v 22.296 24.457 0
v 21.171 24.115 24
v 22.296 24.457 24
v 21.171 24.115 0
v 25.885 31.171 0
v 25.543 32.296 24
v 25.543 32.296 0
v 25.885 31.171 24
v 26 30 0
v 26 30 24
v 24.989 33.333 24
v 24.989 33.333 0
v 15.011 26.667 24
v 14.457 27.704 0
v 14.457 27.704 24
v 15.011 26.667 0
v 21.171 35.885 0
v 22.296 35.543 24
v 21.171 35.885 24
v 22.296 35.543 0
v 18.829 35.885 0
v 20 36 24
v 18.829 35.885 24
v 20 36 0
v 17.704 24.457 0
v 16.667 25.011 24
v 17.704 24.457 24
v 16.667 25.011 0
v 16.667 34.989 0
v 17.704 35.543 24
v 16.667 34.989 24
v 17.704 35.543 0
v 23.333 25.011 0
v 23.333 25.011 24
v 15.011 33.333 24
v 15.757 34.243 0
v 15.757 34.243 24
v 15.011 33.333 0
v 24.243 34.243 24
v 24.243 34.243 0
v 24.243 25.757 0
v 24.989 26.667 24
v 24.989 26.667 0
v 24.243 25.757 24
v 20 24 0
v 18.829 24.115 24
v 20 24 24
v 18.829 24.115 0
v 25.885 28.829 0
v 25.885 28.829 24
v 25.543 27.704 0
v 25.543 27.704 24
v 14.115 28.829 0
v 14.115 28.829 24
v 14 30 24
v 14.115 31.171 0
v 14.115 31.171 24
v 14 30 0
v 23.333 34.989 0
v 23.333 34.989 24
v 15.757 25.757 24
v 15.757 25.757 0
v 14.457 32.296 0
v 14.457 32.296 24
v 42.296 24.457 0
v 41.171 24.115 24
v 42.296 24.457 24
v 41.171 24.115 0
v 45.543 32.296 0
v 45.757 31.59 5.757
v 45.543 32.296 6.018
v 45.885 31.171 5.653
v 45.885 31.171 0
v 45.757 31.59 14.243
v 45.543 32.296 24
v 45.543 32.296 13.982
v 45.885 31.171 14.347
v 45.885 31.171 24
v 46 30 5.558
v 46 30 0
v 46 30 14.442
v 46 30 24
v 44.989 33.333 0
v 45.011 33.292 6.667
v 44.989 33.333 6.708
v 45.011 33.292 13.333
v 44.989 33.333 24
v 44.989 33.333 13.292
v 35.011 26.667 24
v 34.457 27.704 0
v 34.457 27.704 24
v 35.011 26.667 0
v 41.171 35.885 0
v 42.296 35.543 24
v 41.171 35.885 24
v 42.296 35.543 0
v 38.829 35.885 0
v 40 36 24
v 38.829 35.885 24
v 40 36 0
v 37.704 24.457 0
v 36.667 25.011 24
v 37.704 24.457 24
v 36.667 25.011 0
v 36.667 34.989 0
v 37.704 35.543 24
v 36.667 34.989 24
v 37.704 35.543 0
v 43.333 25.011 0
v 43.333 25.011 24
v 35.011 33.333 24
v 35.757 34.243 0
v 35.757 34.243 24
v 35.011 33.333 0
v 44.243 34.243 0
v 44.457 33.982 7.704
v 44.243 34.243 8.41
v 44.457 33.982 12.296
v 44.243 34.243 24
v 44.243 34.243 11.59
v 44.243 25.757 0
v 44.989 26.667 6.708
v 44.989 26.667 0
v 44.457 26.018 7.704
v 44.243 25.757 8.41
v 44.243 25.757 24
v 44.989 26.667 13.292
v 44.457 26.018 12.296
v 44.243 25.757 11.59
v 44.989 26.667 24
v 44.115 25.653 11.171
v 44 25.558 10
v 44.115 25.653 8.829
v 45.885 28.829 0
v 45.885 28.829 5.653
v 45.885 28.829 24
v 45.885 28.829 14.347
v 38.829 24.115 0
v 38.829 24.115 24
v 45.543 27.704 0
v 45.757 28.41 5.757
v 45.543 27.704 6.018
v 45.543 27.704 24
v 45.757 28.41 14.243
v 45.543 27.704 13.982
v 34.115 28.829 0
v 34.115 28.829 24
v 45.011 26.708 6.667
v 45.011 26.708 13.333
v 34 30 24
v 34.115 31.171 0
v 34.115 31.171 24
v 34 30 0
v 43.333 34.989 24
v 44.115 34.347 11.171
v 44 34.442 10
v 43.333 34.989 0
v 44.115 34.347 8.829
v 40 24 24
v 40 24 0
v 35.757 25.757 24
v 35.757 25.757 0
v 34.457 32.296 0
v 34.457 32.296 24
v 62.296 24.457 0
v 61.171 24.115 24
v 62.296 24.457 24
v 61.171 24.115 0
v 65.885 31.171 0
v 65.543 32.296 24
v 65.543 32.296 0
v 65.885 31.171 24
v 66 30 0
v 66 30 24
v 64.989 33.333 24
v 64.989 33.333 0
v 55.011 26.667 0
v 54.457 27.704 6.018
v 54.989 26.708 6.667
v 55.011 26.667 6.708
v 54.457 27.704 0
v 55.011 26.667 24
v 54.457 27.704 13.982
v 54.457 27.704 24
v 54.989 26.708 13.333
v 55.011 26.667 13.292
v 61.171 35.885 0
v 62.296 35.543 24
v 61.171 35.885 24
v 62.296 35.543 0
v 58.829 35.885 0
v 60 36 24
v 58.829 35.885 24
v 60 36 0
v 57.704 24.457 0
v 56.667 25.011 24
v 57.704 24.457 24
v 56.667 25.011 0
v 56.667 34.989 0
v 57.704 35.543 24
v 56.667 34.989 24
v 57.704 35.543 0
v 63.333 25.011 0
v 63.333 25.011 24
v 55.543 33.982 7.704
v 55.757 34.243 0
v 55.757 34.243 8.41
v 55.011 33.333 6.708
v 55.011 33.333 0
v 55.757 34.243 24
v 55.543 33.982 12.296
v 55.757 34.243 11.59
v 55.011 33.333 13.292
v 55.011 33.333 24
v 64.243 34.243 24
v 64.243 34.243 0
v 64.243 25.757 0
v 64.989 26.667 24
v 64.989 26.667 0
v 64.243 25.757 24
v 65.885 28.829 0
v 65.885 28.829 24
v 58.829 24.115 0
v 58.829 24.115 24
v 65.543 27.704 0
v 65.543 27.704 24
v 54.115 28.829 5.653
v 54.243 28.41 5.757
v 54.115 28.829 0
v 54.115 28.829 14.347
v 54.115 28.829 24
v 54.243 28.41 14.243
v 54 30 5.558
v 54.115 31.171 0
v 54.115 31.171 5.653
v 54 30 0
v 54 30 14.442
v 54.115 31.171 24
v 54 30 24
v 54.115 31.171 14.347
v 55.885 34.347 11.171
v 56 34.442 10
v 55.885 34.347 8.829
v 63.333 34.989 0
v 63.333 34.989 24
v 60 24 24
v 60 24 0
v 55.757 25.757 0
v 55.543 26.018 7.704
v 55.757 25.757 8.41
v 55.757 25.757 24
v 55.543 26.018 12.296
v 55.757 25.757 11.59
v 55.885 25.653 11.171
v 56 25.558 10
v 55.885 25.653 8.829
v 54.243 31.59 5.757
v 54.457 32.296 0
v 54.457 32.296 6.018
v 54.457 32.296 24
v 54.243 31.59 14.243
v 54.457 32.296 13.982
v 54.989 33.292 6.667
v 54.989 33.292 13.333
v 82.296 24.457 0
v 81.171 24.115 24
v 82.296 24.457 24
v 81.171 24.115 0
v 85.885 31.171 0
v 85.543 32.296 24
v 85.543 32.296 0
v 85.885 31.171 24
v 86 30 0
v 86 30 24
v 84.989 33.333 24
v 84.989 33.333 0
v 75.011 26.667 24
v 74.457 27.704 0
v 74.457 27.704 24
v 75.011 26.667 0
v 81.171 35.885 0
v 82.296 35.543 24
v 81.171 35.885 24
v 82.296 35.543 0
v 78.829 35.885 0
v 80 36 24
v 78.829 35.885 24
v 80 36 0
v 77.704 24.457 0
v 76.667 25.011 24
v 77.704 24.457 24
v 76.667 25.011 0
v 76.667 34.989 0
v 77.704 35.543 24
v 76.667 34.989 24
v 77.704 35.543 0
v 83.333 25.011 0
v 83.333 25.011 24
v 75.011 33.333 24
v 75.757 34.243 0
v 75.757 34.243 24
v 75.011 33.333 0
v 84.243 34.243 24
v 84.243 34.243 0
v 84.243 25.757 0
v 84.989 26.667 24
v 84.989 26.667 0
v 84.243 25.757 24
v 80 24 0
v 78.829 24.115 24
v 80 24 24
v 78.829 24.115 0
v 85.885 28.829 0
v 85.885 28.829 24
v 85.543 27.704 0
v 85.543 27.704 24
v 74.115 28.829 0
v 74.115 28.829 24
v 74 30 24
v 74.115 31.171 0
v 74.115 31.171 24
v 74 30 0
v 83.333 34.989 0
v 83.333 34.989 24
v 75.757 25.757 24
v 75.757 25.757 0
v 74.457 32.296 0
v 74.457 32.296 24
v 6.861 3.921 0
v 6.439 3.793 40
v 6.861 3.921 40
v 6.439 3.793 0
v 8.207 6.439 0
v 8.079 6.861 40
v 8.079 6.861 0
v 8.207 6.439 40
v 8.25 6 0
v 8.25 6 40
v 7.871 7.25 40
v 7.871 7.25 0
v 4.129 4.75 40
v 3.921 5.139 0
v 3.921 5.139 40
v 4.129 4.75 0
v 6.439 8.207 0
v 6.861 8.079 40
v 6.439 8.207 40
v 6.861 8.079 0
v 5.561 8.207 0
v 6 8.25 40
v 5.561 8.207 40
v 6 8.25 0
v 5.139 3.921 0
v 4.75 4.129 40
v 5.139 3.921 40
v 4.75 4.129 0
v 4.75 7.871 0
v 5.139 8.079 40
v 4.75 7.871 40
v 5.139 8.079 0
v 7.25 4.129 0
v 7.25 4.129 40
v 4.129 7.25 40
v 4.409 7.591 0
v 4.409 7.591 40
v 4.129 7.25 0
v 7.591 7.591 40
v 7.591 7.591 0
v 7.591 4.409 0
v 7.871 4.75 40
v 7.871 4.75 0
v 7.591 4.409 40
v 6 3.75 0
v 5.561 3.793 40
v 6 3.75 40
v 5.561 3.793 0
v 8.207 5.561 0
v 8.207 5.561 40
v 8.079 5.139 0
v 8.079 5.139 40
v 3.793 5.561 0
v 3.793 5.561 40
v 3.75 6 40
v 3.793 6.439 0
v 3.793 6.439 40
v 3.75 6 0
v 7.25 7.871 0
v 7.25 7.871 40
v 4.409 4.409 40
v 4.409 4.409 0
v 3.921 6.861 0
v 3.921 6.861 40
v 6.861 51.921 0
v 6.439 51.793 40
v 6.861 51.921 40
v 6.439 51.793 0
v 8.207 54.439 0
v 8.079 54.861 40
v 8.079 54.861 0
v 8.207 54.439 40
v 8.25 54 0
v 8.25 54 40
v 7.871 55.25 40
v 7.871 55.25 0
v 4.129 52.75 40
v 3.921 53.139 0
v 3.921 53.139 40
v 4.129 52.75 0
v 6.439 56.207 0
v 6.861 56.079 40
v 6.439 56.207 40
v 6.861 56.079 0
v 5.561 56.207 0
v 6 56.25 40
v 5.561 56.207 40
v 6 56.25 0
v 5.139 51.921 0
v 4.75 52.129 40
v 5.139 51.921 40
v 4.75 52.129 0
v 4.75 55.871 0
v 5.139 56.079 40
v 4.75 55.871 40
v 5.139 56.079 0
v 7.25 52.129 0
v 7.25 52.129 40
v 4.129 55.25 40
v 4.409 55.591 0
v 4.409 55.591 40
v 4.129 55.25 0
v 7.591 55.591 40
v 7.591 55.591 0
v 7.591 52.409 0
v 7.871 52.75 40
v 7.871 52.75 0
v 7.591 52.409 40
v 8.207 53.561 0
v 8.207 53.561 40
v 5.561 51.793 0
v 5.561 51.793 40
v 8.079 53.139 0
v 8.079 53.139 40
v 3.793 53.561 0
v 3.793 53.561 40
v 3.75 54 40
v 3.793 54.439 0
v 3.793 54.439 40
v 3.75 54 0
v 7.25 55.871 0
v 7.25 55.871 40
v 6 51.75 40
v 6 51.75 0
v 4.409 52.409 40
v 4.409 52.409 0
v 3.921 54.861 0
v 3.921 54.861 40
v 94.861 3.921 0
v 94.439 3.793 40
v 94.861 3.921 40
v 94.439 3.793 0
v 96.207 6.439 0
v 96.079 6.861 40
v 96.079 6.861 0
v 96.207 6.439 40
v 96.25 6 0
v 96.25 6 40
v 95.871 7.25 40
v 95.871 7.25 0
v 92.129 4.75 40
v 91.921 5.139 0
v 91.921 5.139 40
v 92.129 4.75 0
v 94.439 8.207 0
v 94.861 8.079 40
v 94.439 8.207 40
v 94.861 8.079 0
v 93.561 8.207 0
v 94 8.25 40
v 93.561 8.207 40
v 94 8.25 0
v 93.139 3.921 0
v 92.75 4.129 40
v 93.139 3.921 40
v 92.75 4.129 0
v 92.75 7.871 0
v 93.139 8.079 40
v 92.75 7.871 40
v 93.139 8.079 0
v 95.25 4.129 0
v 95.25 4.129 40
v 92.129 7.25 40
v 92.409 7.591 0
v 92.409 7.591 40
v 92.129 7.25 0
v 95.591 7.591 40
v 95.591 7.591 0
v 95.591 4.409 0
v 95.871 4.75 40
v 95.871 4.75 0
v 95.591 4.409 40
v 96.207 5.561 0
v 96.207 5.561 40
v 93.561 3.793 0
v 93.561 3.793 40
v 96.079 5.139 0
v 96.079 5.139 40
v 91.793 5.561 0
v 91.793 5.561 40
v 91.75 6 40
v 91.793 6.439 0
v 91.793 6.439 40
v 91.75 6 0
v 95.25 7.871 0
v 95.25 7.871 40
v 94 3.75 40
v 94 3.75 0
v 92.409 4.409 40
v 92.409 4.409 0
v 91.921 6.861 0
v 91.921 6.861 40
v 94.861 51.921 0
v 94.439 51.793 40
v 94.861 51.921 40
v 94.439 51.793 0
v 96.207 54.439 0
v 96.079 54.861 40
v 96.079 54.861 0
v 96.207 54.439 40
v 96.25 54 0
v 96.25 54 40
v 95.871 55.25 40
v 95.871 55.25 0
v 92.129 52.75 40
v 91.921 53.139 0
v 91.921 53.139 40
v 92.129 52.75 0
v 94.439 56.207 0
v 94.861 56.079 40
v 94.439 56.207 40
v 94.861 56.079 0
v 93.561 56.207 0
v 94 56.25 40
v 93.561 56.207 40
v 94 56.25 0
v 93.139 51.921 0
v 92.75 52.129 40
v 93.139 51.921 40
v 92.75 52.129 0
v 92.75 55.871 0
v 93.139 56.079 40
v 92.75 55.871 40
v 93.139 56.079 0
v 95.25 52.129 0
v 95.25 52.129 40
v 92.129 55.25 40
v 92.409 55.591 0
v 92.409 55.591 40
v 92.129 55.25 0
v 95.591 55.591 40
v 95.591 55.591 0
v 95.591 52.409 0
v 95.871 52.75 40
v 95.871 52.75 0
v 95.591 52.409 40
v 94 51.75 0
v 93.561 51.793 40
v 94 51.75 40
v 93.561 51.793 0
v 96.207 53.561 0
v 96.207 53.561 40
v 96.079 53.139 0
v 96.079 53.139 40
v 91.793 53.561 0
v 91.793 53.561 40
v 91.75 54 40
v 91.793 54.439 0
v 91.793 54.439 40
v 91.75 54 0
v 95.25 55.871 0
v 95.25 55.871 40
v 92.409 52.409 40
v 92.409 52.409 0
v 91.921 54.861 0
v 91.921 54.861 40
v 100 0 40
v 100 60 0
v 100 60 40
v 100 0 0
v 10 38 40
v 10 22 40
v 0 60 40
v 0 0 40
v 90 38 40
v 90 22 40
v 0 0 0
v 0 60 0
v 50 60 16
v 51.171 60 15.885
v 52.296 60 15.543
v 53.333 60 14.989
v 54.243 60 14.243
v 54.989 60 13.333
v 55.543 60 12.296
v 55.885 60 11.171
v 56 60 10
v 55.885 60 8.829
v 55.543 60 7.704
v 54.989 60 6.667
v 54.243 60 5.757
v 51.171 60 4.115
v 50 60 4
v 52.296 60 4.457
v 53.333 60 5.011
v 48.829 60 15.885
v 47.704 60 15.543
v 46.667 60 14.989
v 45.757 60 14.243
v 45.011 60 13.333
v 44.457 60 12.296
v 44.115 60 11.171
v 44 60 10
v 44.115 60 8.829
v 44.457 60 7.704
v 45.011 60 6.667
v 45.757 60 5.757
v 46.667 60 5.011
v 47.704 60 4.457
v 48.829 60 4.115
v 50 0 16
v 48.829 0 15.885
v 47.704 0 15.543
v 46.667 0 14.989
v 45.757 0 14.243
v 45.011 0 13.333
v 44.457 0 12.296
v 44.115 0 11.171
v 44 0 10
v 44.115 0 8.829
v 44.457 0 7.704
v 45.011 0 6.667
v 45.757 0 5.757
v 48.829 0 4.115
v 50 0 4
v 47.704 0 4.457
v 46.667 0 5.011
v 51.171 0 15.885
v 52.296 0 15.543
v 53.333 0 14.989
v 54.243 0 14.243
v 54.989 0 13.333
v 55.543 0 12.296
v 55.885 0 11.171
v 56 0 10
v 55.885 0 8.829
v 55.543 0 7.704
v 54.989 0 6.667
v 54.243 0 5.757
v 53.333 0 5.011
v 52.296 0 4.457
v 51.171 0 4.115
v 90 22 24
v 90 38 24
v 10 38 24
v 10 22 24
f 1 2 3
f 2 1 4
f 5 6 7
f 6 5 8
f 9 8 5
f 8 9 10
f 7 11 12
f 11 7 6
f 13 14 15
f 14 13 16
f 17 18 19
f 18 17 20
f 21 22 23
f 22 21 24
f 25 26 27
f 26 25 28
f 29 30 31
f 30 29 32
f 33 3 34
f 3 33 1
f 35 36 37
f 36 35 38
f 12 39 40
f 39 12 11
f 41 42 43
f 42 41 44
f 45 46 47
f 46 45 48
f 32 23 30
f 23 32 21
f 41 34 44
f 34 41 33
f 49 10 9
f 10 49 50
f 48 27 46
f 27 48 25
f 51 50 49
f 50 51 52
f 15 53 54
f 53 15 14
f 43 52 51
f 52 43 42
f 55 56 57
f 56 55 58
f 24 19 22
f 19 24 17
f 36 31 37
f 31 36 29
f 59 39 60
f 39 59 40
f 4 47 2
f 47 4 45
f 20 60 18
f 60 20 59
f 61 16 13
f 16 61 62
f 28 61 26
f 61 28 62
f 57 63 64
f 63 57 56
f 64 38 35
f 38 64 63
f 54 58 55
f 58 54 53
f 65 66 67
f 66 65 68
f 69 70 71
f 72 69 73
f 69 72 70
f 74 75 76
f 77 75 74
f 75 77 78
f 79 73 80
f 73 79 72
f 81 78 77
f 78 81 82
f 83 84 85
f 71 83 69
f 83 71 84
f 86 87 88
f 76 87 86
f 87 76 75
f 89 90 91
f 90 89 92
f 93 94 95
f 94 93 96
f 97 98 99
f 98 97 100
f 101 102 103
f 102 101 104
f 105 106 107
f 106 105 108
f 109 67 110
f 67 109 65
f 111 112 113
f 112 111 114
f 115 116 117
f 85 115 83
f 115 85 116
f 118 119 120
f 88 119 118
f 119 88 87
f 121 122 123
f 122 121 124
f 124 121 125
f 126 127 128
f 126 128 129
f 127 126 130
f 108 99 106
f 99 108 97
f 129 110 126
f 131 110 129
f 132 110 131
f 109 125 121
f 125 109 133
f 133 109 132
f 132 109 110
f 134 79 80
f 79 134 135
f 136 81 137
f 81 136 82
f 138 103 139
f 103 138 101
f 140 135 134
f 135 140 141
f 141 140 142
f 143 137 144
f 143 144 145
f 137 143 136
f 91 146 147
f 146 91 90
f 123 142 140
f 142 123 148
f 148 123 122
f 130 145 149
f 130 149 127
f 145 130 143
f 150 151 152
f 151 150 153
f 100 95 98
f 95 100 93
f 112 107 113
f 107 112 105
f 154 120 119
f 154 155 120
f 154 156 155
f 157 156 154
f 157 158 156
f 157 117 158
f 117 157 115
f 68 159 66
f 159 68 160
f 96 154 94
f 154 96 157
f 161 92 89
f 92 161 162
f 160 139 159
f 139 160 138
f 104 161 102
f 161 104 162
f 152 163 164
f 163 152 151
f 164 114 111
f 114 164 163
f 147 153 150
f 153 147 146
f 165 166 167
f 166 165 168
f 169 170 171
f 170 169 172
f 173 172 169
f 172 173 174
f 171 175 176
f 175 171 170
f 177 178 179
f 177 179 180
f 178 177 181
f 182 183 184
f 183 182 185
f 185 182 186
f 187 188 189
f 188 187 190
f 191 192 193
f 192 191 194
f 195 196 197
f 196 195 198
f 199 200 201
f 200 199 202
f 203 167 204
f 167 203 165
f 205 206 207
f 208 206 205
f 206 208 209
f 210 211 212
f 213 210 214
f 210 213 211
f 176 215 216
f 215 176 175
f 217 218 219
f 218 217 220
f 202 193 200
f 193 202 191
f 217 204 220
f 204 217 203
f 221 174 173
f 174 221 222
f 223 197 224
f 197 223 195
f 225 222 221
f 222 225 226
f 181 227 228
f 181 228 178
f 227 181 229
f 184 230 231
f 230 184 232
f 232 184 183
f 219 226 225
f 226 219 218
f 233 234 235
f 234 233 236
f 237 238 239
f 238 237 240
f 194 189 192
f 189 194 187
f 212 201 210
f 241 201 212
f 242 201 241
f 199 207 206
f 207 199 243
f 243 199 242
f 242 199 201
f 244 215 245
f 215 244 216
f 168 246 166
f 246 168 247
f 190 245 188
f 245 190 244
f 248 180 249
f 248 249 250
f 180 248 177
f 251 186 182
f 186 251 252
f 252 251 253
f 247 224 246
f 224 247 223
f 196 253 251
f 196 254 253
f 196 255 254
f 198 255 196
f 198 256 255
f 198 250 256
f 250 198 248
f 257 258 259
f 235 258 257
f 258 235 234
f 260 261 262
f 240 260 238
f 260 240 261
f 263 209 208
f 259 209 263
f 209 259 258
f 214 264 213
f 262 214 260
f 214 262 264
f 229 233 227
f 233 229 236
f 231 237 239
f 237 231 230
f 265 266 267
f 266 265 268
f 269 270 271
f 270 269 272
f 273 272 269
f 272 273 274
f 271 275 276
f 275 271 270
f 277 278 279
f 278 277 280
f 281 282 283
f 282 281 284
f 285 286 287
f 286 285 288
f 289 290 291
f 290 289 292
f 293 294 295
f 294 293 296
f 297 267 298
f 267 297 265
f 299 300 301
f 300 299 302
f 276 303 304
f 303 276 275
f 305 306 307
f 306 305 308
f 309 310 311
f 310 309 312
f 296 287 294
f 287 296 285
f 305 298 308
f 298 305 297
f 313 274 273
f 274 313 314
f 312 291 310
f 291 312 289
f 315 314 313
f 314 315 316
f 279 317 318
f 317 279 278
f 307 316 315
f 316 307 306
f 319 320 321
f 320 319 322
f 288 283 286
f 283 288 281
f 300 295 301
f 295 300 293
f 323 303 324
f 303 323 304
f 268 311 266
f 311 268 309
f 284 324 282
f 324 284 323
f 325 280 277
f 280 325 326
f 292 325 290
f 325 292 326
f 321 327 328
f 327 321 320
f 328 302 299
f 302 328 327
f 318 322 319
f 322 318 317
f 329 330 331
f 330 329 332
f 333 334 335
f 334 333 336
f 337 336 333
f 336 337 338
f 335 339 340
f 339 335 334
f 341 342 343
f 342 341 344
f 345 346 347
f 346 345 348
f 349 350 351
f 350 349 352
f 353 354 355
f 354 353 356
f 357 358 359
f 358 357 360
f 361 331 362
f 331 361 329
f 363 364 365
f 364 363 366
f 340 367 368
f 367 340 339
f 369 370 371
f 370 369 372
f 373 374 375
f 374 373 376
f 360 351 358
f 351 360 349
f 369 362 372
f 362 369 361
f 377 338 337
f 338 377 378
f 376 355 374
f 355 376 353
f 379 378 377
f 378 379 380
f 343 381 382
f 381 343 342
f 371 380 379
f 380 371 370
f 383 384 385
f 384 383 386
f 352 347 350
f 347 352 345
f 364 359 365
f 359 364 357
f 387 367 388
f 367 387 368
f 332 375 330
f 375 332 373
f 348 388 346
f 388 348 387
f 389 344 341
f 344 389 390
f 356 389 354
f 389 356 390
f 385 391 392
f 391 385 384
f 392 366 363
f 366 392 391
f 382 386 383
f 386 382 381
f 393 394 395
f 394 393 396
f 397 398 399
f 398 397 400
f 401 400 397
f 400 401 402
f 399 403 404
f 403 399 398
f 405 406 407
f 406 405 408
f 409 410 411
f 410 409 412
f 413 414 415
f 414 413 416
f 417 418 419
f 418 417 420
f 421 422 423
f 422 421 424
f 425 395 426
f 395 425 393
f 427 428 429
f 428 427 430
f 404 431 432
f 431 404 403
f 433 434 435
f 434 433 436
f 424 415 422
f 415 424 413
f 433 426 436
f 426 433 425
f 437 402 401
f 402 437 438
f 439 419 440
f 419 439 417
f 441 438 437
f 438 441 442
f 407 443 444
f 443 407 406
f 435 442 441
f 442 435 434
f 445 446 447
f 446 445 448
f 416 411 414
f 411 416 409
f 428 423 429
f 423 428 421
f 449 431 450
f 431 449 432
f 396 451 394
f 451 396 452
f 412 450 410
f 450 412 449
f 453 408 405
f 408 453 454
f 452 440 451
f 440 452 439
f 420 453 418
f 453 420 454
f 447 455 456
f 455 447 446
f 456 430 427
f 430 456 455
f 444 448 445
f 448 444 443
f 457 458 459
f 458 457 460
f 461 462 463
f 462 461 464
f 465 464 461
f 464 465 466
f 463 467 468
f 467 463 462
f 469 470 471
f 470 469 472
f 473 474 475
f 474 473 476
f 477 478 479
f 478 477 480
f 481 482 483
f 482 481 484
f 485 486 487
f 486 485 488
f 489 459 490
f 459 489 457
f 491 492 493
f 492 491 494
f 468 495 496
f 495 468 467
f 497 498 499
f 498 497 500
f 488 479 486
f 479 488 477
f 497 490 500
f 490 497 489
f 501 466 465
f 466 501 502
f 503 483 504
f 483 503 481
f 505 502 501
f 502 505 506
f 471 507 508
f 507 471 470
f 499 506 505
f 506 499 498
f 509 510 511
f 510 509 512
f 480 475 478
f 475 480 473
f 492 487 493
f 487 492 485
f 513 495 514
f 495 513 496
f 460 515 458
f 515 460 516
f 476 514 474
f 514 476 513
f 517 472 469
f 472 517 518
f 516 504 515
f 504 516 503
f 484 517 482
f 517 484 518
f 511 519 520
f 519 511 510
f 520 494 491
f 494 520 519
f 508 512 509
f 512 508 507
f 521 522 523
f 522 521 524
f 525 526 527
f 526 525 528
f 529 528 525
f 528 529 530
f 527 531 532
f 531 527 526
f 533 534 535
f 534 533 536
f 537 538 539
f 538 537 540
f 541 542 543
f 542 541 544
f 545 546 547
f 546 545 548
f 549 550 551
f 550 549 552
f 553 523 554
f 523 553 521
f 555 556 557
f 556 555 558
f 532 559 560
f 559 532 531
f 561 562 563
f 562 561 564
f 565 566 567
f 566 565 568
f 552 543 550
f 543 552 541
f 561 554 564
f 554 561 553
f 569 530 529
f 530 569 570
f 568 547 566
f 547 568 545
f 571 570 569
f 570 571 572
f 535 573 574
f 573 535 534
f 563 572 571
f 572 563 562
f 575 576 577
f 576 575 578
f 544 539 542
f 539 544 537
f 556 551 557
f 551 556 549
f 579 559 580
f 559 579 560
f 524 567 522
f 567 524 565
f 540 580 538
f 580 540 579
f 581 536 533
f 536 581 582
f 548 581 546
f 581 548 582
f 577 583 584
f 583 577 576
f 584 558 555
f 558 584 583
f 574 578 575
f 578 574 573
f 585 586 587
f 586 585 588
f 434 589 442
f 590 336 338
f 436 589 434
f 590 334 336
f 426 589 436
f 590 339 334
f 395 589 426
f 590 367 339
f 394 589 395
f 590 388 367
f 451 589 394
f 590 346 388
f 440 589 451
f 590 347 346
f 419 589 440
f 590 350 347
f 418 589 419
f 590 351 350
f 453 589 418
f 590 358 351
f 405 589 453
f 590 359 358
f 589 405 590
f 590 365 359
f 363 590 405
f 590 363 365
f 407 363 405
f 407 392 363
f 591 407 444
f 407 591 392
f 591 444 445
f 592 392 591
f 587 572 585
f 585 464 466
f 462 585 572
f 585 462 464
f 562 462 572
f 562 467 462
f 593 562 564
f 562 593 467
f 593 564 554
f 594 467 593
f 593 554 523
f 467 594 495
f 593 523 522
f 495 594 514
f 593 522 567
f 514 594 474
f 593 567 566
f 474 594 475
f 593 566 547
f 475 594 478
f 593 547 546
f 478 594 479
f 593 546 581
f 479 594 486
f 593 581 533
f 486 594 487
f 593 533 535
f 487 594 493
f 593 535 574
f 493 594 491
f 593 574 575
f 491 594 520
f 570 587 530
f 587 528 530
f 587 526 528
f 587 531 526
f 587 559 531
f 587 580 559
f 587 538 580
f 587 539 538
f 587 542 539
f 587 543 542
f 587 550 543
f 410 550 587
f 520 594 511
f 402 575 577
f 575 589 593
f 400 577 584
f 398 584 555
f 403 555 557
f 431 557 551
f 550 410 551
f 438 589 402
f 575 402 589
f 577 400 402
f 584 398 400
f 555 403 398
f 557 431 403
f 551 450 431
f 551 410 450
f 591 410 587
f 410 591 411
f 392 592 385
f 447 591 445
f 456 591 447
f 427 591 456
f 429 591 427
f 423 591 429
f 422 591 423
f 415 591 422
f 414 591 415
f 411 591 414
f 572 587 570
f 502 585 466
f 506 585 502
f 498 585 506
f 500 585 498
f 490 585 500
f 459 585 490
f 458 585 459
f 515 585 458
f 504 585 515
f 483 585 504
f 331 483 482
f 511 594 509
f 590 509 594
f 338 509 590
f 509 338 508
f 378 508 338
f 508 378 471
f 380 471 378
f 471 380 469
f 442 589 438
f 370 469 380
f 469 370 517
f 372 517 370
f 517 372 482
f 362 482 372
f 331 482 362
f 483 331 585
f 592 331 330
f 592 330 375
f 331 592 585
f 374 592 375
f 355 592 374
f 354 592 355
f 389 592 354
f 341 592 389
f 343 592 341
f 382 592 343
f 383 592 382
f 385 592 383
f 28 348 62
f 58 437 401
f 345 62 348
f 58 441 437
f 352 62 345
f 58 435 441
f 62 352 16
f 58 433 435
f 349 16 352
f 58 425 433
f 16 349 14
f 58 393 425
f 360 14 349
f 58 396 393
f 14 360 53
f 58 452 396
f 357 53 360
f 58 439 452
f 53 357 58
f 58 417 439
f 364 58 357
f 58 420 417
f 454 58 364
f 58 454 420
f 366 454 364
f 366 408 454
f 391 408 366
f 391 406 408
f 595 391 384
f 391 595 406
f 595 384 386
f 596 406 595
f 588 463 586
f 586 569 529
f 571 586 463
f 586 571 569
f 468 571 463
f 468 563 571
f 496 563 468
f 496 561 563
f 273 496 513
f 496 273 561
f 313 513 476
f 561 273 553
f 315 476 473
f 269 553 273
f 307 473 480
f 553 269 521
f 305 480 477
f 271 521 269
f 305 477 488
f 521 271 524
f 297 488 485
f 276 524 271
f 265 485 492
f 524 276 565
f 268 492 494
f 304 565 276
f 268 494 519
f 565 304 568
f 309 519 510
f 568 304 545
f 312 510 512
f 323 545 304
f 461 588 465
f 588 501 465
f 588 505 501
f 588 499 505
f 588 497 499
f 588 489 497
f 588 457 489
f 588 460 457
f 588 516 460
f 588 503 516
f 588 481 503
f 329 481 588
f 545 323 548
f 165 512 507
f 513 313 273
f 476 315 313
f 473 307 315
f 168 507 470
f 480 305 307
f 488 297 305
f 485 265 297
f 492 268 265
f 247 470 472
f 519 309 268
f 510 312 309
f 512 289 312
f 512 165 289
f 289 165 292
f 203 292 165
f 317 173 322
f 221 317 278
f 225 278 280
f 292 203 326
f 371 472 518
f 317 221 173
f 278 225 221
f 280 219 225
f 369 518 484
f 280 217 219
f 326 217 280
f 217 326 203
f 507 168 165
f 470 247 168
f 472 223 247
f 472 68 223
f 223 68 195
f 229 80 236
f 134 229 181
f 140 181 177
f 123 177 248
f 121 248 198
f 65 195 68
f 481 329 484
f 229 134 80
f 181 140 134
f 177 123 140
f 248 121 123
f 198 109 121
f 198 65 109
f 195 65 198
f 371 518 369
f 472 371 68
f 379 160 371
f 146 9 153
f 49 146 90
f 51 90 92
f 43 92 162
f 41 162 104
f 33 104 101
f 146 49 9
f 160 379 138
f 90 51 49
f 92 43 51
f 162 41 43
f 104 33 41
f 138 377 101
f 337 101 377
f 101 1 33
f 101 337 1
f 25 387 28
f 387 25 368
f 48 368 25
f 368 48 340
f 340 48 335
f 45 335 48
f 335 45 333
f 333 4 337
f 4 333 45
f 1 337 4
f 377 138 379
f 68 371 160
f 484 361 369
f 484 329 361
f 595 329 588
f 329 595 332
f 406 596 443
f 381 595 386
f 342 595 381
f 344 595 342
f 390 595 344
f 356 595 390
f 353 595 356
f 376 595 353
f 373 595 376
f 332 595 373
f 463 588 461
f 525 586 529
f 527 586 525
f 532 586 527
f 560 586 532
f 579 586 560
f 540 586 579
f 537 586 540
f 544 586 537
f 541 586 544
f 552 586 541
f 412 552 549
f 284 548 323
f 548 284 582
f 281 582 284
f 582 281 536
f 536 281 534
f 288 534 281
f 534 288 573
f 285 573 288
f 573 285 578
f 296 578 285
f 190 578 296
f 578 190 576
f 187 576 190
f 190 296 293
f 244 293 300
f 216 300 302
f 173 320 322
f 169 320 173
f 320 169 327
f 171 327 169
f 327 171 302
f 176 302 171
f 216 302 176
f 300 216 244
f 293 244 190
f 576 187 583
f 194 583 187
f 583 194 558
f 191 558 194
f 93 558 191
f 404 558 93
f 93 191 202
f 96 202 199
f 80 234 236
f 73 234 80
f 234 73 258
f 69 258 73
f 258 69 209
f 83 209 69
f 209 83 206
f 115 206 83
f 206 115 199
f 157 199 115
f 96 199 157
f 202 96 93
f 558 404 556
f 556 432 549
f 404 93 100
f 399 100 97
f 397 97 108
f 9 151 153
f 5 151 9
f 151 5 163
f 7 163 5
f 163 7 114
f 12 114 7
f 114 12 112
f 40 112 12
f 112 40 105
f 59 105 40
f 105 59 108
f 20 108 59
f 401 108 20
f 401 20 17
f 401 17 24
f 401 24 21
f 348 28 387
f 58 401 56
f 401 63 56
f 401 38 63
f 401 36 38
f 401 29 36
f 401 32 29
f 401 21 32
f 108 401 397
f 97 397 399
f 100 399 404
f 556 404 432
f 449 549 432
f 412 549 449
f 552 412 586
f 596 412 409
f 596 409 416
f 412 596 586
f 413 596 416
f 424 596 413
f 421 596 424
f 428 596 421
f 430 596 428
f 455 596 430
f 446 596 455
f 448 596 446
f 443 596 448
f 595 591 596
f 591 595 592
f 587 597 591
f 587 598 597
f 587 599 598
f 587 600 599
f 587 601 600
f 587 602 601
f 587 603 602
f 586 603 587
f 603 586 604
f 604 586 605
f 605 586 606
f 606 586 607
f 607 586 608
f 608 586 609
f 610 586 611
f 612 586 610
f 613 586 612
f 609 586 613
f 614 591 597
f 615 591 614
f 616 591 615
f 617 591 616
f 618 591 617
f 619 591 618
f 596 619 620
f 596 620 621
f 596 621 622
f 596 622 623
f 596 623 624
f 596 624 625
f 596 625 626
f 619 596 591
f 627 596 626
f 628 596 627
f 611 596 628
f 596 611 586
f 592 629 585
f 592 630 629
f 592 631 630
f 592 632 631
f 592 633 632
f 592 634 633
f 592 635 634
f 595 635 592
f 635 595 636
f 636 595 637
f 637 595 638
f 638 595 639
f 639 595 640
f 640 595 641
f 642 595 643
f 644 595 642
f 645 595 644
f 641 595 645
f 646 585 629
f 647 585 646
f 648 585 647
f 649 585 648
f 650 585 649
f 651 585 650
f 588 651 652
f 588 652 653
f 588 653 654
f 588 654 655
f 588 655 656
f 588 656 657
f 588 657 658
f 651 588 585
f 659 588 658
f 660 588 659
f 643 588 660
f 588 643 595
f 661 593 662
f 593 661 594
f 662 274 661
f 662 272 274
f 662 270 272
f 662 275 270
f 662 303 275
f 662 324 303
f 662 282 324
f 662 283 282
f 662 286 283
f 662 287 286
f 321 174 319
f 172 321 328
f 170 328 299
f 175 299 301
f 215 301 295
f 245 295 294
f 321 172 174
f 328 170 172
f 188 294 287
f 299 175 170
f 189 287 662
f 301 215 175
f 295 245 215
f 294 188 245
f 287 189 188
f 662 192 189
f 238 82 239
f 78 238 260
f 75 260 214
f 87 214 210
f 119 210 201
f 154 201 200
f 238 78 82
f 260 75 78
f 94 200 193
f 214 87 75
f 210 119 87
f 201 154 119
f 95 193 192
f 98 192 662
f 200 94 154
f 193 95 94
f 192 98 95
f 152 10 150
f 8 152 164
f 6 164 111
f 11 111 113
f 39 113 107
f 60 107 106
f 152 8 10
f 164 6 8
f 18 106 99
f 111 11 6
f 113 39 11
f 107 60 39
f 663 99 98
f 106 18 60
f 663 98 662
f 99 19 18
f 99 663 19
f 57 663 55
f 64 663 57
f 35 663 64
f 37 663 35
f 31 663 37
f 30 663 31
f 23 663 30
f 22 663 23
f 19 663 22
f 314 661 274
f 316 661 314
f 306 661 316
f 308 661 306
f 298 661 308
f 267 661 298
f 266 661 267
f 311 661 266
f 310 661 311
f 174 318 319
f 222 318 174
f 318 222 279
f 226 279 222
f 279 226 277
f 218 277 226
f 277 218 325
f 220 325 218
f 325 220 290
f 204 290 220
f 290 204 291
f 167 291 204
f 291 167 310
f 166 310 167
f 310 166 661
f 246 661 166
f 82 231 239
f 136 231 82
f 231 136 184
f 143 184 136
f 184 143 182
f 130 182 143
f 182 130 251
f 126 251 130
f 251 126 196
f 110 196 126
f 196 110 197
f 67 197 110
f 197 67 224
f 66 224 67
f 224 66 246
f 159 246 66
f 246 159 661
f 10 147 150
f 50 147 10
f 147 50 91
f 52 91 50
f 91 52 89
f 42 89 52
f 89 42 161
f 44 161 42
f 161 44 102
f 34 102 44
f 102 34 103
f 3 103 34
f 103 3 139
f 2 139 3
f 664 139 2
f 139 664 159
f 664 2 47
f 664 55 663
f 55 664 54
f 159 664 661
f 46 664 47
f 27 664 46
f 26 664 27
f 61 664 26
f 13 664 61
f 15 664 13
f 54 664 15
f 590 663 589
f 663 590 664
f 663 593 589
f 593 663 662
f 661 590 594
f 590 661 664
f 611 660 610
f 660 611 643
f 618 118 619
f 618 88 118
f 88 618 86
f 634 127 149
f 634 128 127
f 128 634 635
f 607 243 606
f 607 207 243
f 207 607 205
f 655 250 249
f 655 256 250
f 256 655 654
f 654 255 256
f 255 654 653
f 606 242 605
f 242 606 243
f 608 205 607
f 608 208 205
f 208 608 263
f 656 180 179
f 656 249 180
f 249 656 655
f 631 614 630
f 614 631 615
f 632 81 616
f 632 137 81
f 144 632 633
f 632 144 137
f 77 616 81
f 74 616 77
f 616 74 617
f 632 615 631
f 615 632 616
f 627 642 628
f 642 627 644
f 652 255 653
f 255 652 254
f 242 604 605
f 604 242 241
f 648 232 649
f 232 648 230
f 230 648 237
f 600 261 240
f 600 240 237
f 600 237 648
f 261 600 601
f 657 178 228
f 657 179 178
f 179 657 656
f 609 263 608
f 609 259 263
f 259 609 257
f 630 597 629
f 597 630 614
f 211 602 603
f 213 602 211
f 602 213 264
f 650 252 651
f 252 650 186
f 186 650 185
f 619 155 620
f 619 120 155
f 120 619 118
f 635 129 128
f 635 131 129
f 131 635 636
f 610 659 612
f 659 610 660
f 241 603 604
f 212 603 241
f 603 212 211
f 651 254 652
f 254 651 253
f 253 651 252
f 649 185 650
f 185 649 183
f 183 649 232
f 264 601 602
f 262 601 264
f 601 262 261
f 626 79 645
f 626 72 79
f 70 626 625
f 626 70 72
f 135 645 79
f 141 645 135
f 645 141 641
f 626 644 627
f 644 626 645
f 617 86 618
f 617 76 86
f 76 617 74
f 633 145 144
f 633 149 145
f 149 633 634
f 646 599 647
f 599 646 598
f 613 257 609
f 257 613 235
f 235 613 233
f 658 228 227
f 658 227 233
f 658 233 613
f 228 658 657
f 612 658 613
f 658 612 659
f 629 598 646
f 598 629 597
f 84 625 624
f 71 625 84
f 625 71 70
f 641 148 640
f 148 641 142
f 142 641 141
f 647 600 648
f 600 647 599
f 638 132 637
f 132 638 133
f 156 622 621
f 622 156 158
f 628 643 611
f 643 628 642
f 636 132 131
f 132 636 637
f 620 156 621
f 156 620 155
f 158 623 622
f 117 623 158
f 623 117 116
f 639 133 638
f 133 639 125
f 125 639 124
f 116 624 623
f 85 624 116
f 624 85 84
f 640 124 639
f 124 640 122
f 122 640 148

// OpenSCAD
$fn = 32;

// ----------------------------------------------------------------------
// Manifold block: side_outlet manifold
// ----------------------------------------------------------------------

// --- parameters (mm) ---
block_l = 100;            // block length, X
block_w = 60;             // block width, Y
block_h = 40;             // block height, Z
port_d = 12;              // port bore diameter
port_pitch = 20;          // port pitch along X
gallery_d = 16;           // top gallery width, Y
gallery_depth = 16;       // gallery pocket depth
wall_p = 10;              // gallery end wall thickness, X
mnt_d = 4.5;              // mounting hole diameter
mnt_in = 6;               // mounting hole inset from the edges
out_d = 12;               // outlet bore diameter
out_z = 10;               // outlet axis height

n_ports = 4;  // ports in the row
port_x0 = (block_l - (n_ports - 1) * port_pitch) / 2;  // first port X

difference() {
  cube([block_l, block_w, block_h]);
  for (i = [0 : n_ports - 1])
    translate([port_x0 + i * port_pitch, block_w / 2, -1])
      cylinder(h = block_h + 2, d = port_d);
  translate([wall_p, block_w / 2 - gallery_d / 2, block_h - gallery_depth])
    cube([block_l - 2 * wall_p, gallery_d, gallery_depth + 1]);
  for (cx = [mnt_in, block_l - mnt_in])
    for (cy = [mnt_in, block_w - mnt_in])
      translate([cx, cy, -1]) cylinder(h = block_h + 2, d = mnt_d);
  translate([block_l / 2, -1, out_z]) rotate([-90, 0, 0])
    cylinder(h = block_w + 2, d = out_d);
}
